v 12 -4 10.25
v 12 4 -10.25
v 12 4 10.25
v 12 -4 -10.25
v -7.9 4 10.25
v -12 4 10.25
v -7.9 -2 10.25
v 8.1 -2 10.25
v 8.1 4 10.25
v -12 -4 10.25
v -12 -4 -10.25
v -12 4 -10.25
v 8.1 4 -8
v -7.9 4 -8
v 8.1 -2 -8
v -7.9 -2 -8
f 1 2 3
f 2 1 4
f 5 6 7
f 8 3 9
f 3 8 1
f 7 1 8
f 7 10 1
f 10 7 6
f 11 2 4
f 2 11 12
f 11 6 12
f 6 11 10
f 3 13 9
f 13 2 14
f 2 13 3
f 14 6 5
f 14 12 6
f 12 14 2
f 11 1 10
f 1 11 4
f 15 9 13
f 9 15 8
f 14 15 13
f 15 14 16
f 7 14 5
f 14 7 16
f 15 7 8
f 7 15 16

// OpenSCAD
//DHT11-Halterung

difference() {
cube(size = [24,8,20.5], center = true);

translate(v = [-7.9 , -2, -8])
cube(size = [16,7,18.5]);
   
}

/*
translate(v = [-12, -4, 10])
cube(size = [24,4,1.5]);

translate(v = [-10, -2, -8])
color( "red", 1.0 )
cube(size = [12.5,5.8,18]);
*/
